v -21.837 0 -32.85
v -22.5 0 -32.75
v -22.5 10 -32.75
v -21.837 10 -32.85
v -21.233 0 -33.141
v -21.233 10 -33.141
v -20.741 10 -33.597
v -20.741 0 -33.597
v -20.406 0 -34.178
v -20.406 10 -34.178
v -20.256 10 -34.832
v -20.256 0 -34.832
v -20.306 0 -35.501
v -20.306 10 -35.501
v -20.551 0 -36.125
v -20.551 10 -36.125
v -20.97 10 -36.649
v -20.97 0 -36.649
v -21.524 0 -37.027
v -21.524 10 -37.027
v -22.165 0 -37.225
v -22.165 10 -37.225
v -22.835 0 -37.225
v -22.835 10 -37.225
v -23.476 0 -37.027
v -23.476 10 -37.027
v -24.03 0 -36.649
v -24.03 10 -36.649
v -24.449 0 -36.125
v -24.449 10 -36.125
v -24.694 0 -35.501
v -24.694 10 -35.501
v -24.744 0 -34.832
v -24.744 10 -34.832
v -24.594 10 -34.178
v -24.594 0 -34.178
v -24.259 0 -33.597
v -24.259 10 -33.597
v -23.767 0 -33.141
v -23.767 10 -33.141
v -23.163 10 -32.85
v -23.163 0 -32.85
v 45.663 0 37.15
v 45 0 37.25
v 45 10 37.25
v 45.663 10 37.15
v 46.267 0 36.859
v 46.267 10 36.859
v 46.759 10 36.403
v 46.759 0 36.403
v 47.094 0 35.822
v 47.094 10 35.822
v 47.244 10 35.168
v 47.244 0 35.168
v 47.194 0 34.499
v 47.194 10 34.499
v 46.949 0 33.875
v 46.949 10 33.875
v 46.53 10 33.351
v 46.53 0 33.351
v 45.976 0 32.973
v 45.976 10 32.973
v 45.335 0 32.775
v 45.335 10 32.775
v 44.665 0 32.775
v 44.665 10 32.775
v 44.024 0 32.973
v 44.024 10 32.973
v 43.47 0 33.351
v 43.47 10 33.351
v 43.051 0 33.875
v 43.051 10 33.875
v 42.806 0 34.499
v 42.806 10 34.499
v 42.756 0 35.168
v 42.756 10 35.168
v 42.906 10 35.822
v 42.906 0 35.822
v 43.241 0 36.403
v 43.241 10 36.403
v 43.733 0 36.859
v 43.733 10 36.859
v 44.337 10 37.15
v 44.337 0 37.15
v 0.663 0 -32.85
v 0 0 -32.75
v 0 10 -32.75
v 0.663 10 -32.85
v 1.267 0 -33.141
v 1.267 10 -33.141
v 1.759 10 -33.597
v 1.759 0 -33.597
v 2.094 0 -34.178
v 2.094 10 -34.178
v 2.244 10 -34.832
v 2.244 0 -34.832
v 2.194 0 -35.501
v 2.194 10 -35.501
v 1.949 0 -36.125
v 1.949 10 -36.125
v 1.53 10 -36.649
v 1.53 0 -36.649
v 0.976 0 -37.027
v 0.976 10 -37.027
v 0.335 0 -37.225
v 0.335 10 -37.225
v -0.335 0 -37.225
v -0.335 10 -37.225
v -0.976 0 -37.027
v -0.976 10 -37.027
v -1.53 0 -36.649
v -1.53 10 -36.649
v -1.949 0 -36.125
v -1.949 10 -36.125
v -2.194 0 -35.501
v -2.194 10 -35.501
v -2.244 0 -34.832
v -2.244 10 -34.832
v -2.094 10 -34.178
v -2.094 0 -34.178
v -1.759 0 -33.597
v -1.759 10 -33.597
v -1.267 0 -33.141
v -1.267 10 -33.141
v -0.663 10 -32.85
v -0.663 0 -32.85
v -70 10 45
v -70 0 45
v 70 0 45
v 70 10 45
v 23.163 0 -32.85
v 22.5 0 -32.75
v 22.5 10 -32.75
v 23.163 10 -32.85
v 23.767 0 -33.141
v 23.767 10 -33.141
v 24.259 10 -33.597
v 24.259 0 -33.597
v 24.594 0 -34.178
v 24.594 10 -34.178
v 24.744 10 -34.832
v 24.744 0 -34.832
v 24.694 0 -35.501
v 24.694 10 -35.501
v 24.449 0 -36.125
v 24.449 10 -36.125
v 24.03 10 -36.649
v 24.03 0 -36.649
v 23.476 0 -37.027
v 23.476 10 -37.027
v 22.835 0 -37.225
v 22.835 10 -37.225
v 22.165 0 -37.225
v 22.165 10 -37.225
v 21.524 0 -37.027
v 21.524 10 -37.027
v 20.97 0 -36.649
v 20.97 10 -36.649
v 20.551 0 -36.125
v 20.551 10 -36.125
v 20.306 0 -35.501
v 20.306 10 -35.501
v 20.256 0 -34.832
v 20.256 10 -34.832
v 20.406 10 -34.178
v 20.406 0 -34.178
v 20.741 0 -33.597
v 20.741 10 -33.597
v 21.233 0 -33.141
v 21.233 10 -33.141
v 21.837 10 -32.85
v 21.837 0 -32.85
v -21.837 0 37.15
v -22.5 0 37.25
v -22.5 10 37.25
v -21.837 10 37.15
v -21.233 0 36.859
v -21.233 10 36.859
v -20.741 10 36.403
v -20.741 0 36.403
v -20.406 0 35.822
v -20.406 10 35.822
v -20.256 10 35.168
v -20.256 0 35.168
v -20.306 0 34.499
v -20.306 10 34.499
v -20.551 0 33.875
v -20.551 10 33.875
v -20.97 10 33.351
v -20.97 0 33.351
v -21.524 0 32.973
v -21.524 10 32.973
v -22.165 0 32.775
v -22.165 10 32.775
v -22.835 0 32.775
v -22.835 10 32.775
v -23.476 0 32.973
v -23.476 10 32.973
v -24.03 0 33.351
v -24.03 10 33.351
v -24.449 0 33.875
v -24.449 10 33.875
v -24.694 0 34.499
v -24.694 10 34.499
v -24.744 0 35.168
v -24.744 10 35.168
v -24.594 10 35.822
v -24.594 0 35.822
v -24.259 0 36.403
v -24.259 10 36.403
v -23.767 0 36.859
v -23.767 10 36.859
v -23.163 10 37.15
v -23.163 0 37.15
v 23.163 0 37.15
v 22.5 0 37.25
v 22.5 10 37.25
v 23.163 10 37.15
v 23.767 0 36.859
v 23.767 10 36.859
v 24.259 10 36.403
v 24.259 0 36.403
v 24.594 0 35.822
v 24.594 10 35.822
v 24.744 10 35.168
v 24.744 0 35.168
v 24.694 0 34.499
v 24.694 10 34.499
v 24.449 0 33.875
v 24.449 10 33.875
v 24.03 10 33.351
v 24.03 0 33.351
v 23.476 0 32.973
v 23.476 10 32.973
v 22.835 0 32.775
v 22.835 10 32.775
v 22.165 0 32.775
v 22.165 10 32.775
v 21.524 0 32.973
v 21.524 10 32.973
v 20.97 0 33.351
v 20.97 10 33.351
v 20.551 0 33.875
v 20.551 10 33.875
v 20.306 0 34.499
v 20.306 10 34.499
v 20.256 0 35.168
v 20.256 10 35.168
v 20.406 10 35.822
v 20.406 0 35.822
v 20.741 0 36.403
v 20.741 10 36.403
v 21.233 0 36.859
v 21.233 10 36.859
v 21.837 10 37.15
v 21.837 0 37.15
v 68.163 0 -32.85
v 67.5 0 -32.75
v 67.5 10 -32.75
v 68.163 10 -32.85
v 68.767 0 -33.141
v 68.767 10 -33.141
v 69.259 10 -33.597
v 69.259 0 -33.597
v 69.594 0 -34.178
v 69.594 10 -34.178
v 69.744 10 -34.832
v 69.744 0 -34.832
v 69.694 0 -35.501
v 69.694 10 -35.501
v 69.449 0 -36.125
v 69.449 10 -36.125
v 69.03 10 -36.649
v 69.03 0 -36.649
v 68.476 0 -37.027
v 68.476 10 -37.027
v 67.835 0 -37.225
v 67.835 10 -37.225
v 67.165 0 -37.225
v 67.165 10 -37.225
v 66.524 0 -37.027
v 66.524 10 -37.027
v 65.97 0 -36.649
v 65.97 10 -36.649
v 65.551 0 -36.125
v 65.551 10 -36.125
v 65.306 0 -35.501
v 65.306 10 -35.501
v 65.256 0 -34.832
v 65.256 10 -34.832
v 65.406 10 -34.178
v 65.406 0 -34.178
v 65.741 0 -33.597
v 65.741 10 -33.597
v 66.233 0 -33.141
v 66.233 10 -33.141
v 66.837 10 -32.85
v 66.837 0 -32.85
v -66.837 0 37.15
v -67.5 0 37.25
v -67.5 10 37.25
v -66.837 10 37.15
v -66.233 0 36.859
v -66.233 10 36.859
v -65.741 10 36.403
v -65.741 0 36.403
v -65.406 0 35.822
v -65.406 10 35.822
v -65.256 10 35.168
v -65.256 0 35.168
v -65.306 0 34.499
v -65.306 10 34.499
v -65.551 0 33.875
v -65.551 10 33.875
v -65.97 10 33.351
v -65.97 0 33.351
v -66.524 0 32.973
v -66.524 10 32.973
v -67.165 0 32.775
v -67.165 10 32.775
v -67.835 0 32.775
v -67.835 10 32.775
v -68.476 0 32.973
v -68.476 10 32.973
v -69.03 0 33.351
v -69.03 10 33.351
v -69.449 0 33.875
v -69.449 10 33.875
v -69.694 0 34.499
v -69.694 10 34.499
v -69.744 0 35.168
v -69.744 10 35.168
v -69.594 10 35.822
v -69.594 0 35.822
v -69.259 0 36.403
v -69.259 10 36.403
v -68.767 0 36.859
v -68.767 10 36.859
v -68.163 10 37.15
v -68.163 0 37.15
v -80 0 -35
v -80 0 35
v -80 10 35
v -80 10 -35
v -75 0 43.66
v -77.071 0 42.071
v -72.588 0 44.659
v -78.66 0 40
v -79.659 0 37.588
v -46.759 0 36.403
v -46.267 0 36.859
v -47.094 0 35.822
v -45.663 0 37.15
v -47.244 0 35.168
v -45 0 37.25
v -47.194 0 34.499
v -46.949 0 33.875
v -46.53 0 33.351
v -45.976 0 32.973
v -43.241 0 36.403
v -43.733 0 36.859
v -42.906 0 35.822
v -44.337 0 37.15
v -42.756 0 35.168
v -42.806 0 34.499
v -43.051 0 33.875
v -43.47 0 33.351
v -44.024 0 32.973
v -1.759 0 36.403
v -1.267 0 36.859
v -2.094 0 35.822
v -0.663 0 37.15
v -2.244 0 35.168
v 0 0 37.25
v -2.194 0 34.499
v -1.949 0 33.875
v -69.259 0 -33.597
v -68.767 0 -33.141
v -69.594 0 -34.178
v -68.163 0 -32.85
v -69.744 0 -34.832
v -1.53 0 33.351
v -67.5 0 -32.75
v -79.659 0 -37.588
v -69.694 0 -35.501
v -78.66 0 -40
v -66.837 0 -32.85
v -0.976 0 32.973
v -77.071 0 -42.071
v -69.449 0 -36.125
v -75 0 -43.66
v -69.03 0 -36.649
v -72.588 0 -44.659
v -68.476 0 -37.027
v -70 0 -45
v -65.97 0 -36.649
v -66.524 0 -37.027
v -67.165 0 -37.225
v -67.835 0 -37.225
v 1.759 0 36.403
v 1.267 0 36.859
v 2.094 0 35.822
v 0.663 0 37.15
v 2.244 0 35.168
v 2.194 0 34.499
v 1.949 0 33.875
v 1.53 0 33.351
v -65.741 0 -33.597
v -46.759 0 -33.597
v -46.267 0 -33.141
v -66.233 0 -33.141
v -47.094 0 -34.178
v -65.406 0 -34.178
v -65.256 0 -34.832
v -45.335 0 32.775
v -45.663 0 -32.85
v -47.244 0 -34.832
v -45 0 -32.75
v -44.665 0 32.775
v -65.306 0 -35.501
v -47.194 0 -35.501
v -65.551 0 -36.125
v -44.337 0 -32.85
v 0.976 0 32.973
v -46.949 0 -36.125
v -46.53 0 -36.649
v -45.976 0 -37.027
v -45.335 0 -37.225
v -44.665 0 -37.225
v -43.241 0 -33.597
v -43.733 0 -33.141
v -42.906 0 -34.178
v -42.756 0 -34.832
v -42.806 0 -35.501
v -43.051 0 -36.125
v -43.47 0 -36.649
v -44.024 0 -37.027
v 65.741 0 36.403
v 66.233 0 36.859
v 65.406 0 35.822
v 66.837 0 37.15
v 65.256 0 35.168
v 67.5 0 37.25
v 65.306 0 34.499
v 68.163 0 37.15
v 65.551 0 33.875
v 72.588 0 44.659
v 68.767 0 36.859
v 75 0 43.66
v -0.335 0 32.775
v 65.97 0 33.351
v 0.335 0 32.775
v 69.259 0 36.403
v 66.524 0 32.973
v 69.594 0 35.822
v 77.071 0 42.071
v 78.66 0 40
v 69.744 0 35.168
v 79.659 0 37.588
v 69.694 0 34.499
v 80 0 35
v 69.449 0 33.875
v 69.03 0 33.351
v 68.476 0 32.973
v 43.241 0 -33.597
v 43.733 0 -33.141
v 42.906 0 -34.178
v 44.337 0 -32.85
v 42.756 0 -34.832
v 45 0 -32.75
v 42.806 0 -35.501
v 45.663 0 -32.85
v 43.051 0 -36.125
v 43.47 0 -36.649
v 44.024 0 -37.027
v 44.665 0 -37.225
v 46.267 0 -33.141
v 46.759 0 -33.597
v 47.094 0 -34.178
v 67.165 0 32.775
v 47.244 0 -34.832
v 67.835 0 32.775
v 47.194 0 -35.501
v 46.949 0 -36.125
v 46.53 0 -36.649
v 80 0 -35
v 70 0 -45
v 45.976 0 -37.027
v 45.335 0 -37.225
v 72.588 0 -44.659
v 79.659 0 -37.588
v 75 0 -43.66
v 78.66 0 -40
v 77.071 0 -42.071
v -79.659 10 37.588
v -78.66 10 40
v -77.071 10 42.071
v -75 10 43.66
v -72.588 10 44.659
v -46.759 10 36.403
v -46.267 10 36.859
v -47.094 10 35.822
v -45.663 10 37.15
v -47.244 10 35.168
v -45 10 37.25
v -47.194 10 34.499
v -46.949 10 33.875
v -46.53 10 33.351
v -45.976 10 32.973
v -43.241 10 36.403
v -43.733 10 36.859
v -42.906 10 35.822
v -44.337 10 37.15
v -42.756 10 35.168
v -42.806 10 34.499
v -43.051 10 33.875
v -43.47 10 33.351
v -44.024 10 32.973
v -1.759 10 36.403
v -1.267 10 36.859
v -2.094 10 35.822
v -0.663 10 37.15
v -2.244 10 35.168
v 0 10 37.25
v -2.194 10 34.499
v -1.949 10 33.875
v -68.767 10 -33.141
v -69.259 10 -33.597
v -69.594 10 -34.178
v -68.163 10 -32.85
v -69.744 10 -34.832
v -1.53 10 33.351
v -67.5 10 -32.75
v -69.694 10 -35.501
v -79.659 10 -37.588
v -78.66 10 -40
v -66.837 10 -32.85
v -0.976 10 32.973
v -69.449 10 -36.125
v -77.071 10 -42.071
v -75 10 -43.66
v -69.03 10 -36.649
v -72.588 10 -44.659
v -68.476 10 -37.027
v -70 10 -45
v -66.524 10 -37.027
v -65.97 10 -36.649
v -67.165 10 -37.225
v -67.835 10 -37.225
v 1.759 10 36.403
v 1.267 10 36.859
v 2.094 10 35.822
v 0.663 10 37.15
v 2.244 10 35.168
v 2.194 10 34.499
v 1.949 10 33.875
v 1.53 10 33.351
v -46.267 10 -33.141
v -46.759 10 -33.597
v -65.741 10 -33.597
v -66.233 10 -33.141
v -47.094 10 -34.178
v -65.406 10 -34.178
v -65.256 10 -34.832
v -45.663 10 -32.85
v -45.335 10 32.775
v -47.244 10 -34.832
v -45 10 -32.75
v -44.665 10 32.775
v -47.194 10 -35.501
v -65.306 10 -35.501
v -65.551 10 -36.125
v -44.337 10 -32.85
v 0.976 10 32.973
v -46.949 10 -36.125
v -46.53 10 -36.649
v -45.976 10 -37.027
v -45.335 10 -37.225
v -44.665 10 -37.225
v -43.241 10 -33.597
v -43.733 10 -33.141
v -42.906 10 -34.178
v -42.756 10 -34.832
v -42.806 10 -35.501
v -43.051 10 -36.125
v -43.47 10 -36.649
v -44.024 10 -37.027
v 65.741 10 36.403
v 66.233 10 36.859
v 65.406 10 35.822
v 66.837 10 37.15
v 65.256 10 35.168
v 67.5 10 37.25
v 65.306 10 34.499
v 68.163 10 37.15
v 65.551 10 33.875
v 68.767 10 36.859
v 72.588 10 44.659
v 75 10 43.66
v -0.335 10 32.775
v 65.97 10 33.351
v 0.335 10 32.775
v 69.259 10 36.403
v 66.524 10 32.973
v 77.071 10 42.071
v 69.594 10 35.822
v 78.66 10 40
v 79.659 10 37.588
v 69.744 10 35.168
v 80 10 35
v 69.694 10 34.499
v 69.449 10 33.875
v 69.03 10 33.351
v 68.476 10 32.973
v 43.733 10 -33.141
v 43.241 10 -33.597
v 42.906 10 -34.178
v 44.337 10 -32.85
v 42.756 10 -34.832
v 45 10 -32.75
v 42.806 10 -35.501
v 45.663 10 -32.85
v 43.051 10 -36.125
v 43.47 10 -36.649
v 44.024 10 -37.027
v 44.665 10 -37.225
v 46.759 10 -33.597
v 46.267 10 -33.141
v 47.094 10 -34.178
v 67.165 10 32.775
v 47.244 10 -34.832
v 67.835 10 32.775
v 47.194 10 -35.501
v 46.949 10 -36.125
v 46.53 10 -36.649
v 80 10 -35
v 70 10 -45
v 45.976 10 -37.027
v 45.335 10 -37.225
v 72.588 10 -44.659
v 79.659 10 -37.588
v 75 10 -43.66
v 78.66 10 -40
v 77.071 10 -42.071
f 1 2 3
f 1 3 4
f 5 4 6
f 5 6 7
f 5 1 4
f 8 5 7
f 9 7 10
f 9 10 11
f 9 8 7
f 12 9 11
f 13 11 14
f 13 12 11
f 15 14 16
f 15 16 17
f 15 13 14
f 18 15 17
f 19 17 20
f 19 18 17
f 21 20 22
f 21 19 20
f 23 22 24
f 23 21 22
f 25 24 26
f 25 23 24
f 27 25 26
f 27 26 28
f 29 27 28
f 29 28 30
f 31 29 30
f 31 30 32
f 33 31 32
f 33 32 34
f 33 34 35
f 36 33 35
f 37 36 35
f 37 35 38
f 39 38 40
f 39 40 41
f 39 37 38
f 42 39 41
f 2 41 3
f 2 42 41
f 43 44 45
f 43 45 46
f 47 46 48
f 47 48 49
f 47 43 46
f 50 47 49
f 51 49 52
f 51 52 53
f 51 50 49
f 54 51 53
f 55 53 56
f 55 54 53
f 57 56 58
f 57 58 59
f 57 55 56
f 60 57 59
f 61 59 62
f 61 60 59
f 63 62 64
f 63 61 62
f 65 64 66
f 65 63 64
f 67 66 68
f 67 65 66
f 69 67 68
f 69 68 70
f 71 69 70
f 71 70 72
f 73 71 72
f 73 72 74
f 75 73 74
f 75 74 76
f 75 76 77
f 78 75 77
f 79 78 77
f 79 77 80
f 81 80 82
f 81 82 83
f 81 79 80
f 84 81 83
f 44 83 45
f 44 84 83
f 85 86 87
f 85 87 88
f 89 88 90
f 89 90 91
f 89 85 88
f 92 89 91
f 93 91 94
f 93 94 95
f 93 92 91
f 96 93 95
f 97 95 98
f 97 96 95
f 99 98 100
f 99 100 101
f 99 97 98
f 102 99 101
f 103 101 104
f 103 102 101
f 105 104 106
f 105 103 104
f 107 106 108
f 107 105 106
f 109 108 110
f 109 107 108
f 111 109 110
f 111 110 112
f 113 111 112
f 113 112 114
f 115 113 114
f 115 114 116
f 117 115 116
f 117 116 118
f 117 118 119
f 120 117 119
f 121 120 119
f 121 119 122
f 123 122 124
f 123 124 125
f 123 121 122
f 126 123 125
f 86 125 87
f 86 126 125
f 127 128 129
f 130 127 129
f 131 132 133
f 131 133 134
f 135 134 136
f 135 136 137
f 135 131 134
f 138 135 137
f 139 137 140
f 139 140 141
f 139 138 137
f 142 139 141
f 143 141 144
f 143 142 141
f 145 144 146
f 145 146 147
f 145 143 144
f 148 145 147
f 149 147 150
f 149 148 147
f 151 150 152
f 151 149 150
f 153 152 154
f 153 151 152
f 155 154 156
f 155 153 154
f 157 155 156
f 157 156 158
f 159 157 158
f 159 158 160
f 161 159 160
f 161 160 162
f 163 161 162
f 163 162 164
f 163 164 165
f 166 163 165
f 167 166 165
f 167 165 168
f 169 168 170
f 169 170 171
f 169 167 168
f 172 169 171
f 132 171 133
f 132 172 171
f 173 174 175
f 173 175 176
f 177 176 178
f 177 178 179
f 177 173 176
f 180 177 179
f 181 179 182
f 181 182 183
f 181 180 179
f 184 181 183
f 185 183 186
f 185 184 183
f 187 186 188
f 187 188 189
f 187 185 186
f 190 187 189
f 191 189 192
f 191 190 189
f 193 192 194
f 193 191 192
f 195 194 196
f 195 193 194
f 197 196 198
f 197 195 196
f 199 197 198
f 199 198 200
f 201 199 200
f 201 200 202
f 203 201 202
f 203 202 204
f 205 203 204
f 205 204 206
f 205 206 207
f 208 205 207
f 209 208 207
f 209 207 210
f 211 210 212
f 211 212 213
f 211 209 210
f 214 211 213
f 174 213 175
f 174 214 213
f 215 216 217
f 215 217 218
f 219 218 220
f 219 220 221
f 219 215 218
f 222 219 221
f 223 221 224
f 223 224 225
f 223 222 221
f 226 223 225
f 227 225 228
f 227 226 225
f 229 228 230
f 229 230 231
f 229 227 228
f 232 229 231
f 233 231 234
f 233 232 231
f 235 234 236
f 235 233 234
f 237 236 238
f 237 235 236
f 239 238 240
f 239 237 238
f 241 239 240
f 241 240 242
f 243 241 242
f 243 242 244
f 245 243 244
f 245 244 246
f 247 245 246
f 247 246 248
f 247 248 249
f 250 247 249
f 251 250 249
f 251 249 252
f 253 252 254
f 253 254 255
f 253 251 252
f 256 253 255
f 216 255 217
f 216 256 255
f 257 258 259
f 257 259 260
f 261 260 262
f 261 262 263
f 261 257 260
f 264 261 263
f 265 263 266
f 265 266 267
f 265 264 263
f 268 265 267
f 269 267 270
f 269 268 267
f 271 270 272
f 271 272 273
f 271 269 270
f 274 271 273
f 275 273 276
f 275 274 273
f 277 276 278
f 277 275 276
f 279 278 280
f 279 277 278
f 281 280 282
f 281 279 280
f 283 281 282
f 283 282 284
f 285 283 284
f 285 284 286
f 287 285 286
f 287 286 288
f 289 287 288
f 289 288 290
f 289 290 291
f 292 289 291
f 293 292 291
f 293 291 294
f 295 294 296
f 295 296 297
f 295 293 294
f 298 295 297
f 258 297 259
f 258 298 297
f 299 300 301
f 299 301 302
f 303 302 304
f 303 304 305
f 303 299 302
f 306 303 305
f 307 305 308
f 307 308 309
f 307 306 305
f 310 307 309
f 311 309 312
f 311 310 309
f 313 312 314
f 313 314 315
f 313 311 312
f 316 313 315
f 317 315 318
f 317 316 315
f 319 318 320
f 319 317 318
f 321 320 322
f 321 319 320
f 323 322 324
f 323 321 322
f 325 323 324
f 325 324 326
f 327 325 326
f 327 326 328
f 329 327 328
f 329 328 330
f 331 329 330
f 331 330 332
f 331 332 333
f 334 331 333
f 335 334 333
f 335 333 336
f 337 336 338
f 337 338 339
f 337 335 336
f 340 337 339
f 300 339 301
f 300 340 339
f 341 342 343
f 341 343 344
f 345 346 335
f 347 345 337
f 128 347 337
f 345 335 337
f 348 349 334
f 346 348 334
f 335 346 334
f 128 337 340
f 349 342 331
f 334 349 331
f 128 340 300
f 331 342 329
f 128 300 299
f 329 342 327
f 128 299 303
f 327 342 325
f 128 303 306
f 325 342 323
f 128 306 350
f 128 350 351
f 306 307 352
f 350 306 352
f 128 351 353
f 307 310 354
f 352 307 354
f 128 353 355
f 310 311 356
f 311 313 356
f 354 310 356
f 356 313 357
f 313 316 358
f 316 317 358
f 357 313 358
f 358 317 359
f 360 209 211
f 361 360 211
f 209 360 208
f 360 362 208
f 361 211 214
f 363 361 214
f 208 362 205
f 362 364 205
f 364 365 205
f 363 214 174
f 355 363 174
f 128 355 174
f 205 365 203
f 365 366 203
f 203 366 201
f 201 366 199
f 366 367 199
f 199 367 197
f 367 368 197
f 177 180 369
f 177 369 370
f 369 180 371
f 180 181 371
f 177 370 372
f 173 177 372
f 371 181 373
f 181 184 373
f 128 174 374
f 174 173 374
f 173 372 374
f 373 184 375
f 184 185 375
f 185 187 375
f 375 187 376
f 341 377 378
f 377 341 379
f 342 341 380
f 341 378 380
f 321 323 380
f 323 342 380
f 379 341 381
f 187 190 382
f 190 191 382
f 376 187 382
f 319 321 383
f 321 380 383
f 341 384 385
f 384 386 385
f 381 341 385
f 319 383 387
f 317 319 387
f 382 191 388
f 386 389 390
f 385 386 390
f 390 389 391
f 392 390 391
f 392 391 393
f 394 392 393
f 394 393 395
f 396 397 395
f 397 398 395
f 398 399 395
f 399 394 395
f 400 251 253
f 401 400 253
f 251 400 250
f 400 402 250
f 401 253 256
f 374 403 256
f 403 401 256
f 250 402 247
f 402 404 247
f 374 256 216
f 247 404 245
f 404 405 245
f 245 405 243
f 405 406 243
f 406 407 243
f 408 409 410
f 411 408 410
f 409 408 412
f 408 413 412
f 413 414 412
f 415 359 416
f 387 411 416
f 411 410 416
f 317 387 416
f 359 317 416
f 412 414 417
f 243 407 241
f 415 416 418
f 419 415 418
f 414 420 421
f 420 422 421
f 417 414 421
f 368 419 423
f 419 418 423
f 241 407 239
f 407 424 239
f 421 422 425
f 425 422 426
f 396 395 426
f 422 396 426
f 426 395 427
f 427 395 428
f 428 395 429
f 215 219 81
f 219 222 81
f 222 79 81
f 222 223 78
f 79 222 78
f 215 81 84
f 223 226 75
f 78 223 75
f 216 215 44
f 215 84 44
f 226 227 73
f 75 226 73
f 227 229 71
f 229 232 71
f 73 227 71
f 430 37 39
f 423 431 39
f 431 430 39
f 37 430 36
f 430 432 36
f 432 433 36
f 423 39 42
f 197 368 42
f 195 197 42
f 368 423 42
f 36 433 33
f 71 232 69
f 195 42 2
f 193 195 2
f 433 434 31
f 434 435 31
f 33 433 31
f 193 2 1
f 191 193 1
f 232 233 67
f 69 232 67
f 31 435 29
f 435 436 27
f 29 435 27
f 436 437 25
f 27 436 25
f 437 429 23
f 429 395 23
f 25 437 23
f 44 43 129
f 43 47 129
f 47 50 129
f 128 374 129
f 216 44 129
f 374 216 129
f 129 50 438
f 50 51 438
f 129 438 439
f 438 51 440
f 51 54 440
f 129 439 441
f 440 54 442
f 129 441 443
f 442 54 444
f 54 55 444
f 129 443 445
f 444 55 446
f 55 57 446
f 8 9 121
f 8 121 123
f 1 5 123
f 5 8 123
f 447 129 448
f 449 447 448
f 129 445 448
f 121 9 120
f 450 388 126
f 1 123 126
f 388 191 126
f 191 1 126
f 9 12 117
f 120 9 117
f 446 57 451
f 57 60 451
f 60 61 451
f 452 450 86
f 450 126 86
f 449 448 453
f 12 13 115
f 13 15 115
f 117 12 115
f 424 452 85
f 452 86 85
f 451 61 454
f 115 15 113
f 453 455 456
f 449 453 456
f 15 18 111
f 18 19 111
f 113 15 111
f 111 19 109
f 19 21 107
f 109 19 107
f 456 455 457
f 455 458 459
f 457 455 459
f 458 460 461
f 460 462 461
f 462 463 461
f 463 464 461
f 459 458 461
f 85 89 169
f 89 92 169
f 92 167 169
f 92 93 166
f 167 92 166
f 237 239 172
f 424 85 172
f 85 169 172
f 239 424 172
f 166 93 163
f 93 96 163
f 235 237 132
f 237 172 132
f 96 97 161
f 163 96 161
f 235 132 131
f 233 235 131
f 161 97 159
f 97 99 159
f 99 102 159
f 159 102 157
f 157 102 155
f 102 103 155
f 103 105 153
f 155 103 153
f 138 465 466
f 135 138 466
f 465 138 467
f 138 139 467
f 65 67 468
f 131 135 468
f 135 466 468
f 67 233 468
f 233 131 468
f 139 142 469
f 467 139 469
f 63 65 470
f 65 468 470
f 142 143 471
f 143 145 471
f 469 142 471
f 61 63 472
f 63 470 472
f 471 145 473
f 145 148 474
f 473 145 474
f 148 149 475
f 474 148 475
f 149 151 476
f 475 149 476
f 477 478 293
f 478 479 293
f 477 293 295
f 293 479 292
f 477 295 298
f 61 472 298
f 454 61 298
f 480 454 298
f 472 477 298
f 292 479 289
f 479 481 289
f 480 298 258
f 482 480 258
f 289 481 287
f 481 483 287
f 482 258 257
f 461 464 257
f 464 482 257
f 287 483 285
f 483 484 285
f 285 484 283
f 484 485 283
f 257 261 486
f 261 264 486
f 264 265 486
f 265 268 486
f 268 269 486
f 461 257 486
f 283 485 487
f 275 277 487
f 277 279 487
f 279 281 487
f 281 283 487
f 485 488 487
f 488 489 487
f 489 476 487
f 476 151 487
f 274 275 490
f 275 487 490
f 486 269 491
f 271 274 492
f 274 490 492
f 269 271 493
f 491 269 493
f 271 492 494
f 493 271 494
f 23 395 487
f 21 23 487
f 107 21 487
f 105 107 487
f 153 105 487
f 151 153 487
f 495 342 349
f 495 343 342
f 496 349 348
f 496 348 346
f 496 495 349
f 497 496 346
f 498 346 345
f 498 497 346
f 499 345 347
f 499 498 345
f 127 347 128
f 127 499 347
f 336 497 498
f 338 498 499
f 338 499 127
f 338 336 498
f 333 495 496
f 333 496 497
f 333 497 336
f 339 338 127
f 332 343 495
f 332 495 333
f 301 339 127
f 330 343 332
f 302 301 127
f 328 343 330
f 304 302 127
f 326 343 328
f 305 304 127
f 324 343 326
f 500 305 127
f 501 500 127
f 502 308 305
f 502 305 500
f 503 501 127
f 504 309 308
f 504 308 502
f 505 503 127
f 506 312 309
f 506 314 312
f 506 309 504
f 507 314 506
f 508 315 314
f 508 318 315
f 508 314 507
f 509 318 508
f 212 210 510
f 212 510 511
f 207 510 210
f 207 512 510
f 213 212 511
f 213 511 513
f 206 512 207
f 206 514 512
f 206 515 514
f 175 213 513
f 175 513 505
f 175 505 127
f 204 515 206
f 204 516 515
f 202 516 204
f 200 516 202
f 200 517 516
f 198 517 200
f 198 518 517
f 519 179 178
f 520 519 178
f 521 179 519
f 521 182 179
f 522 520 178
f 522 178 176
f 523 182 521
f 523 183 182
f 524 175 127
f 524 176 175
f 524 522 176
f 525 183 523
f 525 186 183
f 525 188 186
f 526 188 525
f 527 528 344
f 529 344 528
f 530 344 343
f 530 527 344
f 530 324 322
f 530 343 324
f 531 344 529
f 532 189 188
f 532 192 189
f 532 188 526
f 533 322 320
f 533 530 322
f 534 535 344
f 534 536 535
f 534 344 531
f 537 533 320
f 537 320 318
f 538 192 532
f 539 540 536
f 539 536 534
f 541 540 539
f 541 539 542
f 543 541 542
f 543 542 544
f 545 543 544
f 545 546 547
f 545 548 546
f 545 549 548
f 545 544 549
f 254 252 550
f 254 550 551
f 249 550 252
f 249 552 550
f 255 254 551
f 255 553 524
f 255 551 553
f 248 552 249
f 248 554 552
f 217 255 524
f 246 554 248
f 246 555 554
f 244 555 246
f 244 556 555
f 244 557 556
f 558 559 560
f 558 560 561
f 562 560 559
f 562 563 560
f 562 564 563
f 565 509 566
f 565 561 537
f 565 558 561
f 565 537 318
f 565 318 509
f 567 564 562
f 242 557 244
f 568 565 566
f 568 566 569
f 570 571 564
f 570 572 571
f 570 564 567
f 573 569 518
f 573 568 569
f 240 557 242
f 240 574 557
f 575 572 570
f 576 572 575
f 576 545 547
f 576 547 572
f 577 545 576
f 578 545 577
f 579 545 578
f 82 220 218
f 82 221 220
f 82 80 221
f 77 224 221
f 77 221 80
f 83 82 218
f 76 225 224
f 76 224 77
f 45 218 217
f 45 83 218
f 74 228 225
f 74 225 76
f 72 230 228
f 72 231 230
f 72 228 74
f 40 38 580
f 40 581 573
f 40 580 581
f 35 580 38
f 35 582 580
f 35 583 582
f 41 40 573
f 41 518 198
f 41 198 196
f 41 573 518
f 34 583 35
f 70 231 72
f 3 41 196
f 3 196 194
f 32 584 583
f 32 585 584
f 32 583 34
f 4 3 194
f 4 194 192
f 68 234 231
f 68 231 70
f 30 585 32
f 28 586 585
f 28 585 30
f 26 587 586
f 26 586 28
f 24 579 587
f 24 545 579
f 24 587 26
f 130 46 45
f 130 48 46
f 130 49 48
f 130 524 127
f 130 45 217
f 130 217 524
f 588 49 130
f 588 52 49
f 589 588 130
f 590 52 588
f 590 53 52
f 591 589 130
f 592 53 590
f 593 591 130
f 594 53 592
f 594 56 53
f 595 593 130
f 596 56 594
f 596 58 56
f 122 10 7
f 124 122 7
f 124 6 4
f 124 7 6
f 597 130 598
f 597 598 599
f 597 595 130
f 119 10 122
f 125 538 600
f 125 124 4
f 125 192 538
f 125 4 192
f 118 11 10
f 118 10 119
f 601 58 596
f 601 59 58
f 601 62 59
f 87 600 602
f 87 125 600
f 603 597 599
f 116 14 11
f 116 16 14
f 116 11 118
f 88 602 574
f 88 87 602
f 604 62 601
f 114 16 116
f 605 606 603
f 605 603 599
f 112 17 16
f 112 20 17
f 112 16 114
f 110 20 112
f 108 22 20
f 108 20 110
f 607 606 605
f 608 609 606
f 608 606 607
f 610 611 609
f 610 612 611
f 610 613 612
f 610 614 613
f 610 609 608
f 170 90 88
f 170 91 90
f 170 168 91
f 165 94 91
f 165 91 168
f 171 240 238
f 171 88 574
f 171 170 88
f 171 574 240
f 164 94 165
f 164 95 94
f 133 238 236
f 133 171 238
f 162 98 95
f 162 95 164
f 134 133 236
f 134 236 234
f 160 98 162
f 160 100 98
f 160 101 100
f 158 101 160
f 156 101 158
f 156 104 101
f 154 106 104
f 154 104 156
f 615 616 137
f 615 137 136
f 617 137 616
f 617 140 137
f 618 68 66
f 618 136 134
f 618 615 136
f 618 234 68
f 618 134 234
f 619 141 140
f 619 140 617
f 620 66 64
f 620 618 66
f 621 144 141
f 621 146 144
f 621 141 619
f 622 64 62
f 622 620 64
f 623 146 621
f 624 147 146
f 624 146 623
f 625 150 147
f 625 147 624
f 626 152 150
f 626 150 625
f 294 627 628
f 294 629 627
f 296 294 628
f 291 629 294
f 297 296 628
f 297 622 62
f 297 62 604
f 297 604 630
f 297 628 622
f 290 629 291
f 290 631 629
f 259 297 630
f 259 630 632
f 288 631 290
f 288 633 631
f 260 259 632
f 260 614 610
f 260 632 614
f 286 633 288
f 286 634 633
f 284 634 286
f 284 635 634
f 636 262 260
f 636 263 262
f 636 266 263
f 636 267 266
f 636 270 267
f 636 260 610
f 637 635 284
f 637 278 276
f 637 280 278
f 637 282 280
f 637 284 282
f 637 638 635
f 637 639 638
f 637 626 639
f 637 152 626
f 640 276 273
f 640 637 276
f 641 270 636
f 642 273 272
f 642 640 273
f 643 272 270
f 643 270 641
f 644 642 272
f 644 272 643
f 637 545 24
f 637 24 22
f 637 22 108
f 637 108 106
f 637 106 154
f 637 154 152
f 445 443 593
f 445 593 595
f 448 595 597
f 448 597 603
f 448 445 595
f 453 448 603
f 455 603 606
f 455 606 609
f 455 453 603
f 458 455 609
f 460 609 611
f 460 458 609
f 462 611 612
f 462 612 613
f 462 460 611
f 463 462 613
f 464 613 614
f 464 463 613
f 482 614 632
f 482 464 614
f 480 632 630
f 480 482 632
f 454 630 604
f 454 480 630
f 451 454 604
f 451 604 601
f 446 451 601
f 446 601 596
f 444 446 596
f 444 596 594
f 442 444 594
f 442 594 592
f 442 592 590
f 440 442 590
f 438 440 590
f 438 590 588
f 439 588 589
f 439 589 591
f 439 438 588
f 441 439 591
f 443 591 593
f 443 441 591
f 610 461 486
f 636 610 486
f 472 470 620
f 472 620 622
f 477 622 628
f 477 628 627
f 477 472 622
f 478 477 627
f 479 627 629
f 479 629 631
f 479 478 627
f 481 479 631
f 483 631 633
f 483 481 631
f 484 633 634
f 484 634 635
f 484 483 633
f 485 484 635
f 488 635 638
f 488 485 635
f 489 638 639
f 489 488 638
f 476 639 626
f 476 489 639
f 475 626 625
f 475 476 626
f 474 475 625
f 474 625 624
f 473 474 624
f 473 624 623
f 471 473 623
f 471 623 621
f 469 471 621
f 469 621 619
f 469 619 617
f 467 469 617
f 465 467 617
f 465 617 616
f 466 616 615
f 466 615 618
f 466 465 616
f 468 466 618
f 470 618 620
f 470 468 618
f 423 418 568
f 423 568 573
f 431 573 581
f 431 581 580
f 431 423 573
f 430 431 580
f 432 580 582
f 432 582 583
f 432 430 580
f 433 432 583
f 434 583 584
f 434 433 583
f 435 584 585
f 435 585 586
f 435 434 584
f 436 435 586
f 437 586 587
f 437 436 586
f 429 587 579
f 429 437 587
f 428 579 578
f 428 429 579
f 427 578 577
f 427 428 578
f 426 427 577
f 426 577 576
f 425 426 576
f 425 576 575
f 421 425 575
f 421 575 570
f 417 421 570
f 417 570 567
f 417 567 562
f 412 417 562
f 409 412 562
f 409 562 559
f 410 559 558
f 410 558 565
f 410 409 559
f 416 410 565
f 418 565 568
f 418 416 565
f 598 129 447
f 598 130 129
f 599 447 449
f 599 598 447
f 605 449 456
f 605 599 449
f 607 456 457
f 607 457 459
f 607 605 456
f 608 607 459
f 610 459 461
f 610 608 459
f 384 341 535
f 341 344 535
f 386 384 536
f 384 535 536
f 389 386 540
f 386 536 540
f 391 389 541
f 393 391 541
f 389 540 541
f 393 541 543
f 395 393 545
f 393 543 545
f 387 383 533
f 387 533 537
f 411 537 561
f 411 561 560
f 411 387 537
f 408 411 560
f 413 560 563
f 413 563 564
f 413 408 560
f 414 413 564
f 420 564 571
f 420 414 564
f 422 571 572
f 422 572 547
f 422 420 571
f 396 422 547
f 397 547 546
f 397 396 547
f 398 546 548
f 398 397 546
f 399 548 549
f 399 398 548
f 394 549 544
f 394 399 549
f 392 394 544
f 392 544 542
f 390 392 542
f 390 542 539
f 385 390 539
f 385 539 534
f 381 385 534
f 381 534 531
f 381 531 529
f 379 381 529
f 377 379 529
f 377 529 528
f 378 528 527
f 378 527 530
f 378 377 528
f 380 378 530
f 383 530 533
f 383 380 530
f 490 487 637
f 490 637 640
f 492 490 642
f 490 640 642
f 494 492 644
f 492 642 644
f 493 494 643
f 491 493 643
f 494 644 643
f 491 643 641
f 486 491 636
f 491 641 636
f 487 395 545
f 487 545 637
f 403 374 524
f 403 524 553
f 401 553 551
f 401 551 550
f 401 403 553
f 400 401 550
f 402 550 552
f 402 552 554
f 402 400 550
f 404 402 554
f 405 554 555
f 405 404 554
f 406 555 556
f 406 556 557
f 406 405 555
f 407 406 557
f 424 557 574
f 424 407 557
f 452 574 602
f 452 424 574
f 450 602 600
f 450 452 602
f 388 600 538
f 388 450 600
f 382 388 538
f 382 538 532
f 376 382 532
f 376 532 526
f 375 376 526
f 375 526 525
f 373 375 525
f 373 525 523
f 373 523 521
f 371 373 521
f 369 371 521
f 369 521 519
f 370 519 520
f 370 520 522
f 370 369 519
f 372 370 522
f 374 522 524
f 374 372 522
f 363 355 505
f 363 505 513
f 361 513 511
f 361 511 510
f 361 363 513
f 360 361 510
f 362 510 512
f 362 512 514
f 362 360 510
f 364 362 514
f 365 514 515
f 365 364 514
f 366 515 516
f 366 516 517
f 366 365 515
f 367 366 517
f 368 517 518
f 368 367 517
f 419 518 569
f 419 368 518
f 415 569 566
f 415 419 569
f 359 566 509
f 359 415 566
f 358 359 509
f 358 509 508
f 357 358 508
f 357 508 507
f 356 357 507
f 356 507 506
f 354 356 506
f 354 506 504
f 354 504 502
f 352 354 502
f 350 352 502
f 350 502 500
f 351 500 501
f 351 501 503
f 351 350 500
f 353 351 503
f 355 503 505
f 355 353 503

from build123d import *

# Parameters (mm, degrees)
SKETCH1_W           = 160
SKETCH1_H           = 90
SKETCH1_R           = 2.25
BOSS_EXTRUDE1_DEPTH = 10
FILLET1_R           = 10


with BuildPart() as part:
    # Sketch1 → Boss-Extrude1 (new body)
    with BuildSketch(Plane(origin=(0, 0, 0), x_dir=(1, 0, 0), z_dir=(0, 1, 0))):
        Rectangle(SKETCH1_W, SKETCH1_H)
        with Locations(Location((-67.5, 35, 0), (0, 0, 270))):
            Circle(SKETCH1_R, mode=Mode.SUBTRACT)
        with Locations(Location((-22.5, 35, 0), (0, 0, 270))):
            Circle(SKETCH1_R, mode=Mode.SUBTRACT)
        with Locations(Location((22.5, 35, 0), (0, 0, 270))):
            Circle(SKETCH1_R, mode=Mode.SUBTRACT)
        with Locations(Location((67.5, 35, 0), (0, 0, 270))):
            Circle(SKETCH1_R, mode=Mode.SUBTRACT)
        with Locations(Location((67.5, -35, 0), (0, 0, 270))):
            Circle(SKETCH1_R, mode=Mode.SUBTRACT)
        with Locations(Location((22.5, -35, 0), (0, 0, 270))):
            Circle(SKETCH1_R, mode=Mode.SUBTRACT)
        with Locations(Location((-22.5, -35, 0), (0, 0, 270))):
            Circle(SKETCH1_R, mode=Mode.SUBTRACT)
        with Locations(Location((-67.5, -35, 0), (0, 0, 270))):
            Circle(SKETCH1_R, mode=Mode.SUBTRACT)
        with Locations(Location((-45, 35, 0), (0, 0, 270))):
            Circle(SKETCH1_R, mode=Mode.SUBTRACT)
        with Locations(Location((45, 35, 0), (0, 0, 270))):
            Circle(SKETCH1_R, mode=Mode.SUBTRACT)
        with Locations(Location((0, 35, 0), (0, 0, 270))):
            Circle(SKETCH1_R, mode=Mode.SUBTRACT)
        with Locations(Location((-45, -35, 0), (0, 0, 270))):
            Circle(SKETCH1_R, mode=Mode.SUBTRACT)
        with Locations(Location((0, -35, 0), (0, 0, 270))):
            Circle(SKETCH1_R, mode=Mode.SUBTRACT)
        with Locations(Location((45, -35, 0), (0, 0, 270))):
            Circle(SKETCH1_R, mode=Mode.SUBTRACT)
    extrude(amount=BOSS_EXTRUDE1_DEPTH)

    # Fillet1
    fillet1_edges = [part.edges().sort_by_distance(p)[0] for p in [
        (-80, 5, -45),
        (80, 5, -45),
        (80, 5, 45),
        (-80, 5, 45),
    ]]
    fillet(fillet1_edges, radius=FILLET1_R)


solid = part.part
